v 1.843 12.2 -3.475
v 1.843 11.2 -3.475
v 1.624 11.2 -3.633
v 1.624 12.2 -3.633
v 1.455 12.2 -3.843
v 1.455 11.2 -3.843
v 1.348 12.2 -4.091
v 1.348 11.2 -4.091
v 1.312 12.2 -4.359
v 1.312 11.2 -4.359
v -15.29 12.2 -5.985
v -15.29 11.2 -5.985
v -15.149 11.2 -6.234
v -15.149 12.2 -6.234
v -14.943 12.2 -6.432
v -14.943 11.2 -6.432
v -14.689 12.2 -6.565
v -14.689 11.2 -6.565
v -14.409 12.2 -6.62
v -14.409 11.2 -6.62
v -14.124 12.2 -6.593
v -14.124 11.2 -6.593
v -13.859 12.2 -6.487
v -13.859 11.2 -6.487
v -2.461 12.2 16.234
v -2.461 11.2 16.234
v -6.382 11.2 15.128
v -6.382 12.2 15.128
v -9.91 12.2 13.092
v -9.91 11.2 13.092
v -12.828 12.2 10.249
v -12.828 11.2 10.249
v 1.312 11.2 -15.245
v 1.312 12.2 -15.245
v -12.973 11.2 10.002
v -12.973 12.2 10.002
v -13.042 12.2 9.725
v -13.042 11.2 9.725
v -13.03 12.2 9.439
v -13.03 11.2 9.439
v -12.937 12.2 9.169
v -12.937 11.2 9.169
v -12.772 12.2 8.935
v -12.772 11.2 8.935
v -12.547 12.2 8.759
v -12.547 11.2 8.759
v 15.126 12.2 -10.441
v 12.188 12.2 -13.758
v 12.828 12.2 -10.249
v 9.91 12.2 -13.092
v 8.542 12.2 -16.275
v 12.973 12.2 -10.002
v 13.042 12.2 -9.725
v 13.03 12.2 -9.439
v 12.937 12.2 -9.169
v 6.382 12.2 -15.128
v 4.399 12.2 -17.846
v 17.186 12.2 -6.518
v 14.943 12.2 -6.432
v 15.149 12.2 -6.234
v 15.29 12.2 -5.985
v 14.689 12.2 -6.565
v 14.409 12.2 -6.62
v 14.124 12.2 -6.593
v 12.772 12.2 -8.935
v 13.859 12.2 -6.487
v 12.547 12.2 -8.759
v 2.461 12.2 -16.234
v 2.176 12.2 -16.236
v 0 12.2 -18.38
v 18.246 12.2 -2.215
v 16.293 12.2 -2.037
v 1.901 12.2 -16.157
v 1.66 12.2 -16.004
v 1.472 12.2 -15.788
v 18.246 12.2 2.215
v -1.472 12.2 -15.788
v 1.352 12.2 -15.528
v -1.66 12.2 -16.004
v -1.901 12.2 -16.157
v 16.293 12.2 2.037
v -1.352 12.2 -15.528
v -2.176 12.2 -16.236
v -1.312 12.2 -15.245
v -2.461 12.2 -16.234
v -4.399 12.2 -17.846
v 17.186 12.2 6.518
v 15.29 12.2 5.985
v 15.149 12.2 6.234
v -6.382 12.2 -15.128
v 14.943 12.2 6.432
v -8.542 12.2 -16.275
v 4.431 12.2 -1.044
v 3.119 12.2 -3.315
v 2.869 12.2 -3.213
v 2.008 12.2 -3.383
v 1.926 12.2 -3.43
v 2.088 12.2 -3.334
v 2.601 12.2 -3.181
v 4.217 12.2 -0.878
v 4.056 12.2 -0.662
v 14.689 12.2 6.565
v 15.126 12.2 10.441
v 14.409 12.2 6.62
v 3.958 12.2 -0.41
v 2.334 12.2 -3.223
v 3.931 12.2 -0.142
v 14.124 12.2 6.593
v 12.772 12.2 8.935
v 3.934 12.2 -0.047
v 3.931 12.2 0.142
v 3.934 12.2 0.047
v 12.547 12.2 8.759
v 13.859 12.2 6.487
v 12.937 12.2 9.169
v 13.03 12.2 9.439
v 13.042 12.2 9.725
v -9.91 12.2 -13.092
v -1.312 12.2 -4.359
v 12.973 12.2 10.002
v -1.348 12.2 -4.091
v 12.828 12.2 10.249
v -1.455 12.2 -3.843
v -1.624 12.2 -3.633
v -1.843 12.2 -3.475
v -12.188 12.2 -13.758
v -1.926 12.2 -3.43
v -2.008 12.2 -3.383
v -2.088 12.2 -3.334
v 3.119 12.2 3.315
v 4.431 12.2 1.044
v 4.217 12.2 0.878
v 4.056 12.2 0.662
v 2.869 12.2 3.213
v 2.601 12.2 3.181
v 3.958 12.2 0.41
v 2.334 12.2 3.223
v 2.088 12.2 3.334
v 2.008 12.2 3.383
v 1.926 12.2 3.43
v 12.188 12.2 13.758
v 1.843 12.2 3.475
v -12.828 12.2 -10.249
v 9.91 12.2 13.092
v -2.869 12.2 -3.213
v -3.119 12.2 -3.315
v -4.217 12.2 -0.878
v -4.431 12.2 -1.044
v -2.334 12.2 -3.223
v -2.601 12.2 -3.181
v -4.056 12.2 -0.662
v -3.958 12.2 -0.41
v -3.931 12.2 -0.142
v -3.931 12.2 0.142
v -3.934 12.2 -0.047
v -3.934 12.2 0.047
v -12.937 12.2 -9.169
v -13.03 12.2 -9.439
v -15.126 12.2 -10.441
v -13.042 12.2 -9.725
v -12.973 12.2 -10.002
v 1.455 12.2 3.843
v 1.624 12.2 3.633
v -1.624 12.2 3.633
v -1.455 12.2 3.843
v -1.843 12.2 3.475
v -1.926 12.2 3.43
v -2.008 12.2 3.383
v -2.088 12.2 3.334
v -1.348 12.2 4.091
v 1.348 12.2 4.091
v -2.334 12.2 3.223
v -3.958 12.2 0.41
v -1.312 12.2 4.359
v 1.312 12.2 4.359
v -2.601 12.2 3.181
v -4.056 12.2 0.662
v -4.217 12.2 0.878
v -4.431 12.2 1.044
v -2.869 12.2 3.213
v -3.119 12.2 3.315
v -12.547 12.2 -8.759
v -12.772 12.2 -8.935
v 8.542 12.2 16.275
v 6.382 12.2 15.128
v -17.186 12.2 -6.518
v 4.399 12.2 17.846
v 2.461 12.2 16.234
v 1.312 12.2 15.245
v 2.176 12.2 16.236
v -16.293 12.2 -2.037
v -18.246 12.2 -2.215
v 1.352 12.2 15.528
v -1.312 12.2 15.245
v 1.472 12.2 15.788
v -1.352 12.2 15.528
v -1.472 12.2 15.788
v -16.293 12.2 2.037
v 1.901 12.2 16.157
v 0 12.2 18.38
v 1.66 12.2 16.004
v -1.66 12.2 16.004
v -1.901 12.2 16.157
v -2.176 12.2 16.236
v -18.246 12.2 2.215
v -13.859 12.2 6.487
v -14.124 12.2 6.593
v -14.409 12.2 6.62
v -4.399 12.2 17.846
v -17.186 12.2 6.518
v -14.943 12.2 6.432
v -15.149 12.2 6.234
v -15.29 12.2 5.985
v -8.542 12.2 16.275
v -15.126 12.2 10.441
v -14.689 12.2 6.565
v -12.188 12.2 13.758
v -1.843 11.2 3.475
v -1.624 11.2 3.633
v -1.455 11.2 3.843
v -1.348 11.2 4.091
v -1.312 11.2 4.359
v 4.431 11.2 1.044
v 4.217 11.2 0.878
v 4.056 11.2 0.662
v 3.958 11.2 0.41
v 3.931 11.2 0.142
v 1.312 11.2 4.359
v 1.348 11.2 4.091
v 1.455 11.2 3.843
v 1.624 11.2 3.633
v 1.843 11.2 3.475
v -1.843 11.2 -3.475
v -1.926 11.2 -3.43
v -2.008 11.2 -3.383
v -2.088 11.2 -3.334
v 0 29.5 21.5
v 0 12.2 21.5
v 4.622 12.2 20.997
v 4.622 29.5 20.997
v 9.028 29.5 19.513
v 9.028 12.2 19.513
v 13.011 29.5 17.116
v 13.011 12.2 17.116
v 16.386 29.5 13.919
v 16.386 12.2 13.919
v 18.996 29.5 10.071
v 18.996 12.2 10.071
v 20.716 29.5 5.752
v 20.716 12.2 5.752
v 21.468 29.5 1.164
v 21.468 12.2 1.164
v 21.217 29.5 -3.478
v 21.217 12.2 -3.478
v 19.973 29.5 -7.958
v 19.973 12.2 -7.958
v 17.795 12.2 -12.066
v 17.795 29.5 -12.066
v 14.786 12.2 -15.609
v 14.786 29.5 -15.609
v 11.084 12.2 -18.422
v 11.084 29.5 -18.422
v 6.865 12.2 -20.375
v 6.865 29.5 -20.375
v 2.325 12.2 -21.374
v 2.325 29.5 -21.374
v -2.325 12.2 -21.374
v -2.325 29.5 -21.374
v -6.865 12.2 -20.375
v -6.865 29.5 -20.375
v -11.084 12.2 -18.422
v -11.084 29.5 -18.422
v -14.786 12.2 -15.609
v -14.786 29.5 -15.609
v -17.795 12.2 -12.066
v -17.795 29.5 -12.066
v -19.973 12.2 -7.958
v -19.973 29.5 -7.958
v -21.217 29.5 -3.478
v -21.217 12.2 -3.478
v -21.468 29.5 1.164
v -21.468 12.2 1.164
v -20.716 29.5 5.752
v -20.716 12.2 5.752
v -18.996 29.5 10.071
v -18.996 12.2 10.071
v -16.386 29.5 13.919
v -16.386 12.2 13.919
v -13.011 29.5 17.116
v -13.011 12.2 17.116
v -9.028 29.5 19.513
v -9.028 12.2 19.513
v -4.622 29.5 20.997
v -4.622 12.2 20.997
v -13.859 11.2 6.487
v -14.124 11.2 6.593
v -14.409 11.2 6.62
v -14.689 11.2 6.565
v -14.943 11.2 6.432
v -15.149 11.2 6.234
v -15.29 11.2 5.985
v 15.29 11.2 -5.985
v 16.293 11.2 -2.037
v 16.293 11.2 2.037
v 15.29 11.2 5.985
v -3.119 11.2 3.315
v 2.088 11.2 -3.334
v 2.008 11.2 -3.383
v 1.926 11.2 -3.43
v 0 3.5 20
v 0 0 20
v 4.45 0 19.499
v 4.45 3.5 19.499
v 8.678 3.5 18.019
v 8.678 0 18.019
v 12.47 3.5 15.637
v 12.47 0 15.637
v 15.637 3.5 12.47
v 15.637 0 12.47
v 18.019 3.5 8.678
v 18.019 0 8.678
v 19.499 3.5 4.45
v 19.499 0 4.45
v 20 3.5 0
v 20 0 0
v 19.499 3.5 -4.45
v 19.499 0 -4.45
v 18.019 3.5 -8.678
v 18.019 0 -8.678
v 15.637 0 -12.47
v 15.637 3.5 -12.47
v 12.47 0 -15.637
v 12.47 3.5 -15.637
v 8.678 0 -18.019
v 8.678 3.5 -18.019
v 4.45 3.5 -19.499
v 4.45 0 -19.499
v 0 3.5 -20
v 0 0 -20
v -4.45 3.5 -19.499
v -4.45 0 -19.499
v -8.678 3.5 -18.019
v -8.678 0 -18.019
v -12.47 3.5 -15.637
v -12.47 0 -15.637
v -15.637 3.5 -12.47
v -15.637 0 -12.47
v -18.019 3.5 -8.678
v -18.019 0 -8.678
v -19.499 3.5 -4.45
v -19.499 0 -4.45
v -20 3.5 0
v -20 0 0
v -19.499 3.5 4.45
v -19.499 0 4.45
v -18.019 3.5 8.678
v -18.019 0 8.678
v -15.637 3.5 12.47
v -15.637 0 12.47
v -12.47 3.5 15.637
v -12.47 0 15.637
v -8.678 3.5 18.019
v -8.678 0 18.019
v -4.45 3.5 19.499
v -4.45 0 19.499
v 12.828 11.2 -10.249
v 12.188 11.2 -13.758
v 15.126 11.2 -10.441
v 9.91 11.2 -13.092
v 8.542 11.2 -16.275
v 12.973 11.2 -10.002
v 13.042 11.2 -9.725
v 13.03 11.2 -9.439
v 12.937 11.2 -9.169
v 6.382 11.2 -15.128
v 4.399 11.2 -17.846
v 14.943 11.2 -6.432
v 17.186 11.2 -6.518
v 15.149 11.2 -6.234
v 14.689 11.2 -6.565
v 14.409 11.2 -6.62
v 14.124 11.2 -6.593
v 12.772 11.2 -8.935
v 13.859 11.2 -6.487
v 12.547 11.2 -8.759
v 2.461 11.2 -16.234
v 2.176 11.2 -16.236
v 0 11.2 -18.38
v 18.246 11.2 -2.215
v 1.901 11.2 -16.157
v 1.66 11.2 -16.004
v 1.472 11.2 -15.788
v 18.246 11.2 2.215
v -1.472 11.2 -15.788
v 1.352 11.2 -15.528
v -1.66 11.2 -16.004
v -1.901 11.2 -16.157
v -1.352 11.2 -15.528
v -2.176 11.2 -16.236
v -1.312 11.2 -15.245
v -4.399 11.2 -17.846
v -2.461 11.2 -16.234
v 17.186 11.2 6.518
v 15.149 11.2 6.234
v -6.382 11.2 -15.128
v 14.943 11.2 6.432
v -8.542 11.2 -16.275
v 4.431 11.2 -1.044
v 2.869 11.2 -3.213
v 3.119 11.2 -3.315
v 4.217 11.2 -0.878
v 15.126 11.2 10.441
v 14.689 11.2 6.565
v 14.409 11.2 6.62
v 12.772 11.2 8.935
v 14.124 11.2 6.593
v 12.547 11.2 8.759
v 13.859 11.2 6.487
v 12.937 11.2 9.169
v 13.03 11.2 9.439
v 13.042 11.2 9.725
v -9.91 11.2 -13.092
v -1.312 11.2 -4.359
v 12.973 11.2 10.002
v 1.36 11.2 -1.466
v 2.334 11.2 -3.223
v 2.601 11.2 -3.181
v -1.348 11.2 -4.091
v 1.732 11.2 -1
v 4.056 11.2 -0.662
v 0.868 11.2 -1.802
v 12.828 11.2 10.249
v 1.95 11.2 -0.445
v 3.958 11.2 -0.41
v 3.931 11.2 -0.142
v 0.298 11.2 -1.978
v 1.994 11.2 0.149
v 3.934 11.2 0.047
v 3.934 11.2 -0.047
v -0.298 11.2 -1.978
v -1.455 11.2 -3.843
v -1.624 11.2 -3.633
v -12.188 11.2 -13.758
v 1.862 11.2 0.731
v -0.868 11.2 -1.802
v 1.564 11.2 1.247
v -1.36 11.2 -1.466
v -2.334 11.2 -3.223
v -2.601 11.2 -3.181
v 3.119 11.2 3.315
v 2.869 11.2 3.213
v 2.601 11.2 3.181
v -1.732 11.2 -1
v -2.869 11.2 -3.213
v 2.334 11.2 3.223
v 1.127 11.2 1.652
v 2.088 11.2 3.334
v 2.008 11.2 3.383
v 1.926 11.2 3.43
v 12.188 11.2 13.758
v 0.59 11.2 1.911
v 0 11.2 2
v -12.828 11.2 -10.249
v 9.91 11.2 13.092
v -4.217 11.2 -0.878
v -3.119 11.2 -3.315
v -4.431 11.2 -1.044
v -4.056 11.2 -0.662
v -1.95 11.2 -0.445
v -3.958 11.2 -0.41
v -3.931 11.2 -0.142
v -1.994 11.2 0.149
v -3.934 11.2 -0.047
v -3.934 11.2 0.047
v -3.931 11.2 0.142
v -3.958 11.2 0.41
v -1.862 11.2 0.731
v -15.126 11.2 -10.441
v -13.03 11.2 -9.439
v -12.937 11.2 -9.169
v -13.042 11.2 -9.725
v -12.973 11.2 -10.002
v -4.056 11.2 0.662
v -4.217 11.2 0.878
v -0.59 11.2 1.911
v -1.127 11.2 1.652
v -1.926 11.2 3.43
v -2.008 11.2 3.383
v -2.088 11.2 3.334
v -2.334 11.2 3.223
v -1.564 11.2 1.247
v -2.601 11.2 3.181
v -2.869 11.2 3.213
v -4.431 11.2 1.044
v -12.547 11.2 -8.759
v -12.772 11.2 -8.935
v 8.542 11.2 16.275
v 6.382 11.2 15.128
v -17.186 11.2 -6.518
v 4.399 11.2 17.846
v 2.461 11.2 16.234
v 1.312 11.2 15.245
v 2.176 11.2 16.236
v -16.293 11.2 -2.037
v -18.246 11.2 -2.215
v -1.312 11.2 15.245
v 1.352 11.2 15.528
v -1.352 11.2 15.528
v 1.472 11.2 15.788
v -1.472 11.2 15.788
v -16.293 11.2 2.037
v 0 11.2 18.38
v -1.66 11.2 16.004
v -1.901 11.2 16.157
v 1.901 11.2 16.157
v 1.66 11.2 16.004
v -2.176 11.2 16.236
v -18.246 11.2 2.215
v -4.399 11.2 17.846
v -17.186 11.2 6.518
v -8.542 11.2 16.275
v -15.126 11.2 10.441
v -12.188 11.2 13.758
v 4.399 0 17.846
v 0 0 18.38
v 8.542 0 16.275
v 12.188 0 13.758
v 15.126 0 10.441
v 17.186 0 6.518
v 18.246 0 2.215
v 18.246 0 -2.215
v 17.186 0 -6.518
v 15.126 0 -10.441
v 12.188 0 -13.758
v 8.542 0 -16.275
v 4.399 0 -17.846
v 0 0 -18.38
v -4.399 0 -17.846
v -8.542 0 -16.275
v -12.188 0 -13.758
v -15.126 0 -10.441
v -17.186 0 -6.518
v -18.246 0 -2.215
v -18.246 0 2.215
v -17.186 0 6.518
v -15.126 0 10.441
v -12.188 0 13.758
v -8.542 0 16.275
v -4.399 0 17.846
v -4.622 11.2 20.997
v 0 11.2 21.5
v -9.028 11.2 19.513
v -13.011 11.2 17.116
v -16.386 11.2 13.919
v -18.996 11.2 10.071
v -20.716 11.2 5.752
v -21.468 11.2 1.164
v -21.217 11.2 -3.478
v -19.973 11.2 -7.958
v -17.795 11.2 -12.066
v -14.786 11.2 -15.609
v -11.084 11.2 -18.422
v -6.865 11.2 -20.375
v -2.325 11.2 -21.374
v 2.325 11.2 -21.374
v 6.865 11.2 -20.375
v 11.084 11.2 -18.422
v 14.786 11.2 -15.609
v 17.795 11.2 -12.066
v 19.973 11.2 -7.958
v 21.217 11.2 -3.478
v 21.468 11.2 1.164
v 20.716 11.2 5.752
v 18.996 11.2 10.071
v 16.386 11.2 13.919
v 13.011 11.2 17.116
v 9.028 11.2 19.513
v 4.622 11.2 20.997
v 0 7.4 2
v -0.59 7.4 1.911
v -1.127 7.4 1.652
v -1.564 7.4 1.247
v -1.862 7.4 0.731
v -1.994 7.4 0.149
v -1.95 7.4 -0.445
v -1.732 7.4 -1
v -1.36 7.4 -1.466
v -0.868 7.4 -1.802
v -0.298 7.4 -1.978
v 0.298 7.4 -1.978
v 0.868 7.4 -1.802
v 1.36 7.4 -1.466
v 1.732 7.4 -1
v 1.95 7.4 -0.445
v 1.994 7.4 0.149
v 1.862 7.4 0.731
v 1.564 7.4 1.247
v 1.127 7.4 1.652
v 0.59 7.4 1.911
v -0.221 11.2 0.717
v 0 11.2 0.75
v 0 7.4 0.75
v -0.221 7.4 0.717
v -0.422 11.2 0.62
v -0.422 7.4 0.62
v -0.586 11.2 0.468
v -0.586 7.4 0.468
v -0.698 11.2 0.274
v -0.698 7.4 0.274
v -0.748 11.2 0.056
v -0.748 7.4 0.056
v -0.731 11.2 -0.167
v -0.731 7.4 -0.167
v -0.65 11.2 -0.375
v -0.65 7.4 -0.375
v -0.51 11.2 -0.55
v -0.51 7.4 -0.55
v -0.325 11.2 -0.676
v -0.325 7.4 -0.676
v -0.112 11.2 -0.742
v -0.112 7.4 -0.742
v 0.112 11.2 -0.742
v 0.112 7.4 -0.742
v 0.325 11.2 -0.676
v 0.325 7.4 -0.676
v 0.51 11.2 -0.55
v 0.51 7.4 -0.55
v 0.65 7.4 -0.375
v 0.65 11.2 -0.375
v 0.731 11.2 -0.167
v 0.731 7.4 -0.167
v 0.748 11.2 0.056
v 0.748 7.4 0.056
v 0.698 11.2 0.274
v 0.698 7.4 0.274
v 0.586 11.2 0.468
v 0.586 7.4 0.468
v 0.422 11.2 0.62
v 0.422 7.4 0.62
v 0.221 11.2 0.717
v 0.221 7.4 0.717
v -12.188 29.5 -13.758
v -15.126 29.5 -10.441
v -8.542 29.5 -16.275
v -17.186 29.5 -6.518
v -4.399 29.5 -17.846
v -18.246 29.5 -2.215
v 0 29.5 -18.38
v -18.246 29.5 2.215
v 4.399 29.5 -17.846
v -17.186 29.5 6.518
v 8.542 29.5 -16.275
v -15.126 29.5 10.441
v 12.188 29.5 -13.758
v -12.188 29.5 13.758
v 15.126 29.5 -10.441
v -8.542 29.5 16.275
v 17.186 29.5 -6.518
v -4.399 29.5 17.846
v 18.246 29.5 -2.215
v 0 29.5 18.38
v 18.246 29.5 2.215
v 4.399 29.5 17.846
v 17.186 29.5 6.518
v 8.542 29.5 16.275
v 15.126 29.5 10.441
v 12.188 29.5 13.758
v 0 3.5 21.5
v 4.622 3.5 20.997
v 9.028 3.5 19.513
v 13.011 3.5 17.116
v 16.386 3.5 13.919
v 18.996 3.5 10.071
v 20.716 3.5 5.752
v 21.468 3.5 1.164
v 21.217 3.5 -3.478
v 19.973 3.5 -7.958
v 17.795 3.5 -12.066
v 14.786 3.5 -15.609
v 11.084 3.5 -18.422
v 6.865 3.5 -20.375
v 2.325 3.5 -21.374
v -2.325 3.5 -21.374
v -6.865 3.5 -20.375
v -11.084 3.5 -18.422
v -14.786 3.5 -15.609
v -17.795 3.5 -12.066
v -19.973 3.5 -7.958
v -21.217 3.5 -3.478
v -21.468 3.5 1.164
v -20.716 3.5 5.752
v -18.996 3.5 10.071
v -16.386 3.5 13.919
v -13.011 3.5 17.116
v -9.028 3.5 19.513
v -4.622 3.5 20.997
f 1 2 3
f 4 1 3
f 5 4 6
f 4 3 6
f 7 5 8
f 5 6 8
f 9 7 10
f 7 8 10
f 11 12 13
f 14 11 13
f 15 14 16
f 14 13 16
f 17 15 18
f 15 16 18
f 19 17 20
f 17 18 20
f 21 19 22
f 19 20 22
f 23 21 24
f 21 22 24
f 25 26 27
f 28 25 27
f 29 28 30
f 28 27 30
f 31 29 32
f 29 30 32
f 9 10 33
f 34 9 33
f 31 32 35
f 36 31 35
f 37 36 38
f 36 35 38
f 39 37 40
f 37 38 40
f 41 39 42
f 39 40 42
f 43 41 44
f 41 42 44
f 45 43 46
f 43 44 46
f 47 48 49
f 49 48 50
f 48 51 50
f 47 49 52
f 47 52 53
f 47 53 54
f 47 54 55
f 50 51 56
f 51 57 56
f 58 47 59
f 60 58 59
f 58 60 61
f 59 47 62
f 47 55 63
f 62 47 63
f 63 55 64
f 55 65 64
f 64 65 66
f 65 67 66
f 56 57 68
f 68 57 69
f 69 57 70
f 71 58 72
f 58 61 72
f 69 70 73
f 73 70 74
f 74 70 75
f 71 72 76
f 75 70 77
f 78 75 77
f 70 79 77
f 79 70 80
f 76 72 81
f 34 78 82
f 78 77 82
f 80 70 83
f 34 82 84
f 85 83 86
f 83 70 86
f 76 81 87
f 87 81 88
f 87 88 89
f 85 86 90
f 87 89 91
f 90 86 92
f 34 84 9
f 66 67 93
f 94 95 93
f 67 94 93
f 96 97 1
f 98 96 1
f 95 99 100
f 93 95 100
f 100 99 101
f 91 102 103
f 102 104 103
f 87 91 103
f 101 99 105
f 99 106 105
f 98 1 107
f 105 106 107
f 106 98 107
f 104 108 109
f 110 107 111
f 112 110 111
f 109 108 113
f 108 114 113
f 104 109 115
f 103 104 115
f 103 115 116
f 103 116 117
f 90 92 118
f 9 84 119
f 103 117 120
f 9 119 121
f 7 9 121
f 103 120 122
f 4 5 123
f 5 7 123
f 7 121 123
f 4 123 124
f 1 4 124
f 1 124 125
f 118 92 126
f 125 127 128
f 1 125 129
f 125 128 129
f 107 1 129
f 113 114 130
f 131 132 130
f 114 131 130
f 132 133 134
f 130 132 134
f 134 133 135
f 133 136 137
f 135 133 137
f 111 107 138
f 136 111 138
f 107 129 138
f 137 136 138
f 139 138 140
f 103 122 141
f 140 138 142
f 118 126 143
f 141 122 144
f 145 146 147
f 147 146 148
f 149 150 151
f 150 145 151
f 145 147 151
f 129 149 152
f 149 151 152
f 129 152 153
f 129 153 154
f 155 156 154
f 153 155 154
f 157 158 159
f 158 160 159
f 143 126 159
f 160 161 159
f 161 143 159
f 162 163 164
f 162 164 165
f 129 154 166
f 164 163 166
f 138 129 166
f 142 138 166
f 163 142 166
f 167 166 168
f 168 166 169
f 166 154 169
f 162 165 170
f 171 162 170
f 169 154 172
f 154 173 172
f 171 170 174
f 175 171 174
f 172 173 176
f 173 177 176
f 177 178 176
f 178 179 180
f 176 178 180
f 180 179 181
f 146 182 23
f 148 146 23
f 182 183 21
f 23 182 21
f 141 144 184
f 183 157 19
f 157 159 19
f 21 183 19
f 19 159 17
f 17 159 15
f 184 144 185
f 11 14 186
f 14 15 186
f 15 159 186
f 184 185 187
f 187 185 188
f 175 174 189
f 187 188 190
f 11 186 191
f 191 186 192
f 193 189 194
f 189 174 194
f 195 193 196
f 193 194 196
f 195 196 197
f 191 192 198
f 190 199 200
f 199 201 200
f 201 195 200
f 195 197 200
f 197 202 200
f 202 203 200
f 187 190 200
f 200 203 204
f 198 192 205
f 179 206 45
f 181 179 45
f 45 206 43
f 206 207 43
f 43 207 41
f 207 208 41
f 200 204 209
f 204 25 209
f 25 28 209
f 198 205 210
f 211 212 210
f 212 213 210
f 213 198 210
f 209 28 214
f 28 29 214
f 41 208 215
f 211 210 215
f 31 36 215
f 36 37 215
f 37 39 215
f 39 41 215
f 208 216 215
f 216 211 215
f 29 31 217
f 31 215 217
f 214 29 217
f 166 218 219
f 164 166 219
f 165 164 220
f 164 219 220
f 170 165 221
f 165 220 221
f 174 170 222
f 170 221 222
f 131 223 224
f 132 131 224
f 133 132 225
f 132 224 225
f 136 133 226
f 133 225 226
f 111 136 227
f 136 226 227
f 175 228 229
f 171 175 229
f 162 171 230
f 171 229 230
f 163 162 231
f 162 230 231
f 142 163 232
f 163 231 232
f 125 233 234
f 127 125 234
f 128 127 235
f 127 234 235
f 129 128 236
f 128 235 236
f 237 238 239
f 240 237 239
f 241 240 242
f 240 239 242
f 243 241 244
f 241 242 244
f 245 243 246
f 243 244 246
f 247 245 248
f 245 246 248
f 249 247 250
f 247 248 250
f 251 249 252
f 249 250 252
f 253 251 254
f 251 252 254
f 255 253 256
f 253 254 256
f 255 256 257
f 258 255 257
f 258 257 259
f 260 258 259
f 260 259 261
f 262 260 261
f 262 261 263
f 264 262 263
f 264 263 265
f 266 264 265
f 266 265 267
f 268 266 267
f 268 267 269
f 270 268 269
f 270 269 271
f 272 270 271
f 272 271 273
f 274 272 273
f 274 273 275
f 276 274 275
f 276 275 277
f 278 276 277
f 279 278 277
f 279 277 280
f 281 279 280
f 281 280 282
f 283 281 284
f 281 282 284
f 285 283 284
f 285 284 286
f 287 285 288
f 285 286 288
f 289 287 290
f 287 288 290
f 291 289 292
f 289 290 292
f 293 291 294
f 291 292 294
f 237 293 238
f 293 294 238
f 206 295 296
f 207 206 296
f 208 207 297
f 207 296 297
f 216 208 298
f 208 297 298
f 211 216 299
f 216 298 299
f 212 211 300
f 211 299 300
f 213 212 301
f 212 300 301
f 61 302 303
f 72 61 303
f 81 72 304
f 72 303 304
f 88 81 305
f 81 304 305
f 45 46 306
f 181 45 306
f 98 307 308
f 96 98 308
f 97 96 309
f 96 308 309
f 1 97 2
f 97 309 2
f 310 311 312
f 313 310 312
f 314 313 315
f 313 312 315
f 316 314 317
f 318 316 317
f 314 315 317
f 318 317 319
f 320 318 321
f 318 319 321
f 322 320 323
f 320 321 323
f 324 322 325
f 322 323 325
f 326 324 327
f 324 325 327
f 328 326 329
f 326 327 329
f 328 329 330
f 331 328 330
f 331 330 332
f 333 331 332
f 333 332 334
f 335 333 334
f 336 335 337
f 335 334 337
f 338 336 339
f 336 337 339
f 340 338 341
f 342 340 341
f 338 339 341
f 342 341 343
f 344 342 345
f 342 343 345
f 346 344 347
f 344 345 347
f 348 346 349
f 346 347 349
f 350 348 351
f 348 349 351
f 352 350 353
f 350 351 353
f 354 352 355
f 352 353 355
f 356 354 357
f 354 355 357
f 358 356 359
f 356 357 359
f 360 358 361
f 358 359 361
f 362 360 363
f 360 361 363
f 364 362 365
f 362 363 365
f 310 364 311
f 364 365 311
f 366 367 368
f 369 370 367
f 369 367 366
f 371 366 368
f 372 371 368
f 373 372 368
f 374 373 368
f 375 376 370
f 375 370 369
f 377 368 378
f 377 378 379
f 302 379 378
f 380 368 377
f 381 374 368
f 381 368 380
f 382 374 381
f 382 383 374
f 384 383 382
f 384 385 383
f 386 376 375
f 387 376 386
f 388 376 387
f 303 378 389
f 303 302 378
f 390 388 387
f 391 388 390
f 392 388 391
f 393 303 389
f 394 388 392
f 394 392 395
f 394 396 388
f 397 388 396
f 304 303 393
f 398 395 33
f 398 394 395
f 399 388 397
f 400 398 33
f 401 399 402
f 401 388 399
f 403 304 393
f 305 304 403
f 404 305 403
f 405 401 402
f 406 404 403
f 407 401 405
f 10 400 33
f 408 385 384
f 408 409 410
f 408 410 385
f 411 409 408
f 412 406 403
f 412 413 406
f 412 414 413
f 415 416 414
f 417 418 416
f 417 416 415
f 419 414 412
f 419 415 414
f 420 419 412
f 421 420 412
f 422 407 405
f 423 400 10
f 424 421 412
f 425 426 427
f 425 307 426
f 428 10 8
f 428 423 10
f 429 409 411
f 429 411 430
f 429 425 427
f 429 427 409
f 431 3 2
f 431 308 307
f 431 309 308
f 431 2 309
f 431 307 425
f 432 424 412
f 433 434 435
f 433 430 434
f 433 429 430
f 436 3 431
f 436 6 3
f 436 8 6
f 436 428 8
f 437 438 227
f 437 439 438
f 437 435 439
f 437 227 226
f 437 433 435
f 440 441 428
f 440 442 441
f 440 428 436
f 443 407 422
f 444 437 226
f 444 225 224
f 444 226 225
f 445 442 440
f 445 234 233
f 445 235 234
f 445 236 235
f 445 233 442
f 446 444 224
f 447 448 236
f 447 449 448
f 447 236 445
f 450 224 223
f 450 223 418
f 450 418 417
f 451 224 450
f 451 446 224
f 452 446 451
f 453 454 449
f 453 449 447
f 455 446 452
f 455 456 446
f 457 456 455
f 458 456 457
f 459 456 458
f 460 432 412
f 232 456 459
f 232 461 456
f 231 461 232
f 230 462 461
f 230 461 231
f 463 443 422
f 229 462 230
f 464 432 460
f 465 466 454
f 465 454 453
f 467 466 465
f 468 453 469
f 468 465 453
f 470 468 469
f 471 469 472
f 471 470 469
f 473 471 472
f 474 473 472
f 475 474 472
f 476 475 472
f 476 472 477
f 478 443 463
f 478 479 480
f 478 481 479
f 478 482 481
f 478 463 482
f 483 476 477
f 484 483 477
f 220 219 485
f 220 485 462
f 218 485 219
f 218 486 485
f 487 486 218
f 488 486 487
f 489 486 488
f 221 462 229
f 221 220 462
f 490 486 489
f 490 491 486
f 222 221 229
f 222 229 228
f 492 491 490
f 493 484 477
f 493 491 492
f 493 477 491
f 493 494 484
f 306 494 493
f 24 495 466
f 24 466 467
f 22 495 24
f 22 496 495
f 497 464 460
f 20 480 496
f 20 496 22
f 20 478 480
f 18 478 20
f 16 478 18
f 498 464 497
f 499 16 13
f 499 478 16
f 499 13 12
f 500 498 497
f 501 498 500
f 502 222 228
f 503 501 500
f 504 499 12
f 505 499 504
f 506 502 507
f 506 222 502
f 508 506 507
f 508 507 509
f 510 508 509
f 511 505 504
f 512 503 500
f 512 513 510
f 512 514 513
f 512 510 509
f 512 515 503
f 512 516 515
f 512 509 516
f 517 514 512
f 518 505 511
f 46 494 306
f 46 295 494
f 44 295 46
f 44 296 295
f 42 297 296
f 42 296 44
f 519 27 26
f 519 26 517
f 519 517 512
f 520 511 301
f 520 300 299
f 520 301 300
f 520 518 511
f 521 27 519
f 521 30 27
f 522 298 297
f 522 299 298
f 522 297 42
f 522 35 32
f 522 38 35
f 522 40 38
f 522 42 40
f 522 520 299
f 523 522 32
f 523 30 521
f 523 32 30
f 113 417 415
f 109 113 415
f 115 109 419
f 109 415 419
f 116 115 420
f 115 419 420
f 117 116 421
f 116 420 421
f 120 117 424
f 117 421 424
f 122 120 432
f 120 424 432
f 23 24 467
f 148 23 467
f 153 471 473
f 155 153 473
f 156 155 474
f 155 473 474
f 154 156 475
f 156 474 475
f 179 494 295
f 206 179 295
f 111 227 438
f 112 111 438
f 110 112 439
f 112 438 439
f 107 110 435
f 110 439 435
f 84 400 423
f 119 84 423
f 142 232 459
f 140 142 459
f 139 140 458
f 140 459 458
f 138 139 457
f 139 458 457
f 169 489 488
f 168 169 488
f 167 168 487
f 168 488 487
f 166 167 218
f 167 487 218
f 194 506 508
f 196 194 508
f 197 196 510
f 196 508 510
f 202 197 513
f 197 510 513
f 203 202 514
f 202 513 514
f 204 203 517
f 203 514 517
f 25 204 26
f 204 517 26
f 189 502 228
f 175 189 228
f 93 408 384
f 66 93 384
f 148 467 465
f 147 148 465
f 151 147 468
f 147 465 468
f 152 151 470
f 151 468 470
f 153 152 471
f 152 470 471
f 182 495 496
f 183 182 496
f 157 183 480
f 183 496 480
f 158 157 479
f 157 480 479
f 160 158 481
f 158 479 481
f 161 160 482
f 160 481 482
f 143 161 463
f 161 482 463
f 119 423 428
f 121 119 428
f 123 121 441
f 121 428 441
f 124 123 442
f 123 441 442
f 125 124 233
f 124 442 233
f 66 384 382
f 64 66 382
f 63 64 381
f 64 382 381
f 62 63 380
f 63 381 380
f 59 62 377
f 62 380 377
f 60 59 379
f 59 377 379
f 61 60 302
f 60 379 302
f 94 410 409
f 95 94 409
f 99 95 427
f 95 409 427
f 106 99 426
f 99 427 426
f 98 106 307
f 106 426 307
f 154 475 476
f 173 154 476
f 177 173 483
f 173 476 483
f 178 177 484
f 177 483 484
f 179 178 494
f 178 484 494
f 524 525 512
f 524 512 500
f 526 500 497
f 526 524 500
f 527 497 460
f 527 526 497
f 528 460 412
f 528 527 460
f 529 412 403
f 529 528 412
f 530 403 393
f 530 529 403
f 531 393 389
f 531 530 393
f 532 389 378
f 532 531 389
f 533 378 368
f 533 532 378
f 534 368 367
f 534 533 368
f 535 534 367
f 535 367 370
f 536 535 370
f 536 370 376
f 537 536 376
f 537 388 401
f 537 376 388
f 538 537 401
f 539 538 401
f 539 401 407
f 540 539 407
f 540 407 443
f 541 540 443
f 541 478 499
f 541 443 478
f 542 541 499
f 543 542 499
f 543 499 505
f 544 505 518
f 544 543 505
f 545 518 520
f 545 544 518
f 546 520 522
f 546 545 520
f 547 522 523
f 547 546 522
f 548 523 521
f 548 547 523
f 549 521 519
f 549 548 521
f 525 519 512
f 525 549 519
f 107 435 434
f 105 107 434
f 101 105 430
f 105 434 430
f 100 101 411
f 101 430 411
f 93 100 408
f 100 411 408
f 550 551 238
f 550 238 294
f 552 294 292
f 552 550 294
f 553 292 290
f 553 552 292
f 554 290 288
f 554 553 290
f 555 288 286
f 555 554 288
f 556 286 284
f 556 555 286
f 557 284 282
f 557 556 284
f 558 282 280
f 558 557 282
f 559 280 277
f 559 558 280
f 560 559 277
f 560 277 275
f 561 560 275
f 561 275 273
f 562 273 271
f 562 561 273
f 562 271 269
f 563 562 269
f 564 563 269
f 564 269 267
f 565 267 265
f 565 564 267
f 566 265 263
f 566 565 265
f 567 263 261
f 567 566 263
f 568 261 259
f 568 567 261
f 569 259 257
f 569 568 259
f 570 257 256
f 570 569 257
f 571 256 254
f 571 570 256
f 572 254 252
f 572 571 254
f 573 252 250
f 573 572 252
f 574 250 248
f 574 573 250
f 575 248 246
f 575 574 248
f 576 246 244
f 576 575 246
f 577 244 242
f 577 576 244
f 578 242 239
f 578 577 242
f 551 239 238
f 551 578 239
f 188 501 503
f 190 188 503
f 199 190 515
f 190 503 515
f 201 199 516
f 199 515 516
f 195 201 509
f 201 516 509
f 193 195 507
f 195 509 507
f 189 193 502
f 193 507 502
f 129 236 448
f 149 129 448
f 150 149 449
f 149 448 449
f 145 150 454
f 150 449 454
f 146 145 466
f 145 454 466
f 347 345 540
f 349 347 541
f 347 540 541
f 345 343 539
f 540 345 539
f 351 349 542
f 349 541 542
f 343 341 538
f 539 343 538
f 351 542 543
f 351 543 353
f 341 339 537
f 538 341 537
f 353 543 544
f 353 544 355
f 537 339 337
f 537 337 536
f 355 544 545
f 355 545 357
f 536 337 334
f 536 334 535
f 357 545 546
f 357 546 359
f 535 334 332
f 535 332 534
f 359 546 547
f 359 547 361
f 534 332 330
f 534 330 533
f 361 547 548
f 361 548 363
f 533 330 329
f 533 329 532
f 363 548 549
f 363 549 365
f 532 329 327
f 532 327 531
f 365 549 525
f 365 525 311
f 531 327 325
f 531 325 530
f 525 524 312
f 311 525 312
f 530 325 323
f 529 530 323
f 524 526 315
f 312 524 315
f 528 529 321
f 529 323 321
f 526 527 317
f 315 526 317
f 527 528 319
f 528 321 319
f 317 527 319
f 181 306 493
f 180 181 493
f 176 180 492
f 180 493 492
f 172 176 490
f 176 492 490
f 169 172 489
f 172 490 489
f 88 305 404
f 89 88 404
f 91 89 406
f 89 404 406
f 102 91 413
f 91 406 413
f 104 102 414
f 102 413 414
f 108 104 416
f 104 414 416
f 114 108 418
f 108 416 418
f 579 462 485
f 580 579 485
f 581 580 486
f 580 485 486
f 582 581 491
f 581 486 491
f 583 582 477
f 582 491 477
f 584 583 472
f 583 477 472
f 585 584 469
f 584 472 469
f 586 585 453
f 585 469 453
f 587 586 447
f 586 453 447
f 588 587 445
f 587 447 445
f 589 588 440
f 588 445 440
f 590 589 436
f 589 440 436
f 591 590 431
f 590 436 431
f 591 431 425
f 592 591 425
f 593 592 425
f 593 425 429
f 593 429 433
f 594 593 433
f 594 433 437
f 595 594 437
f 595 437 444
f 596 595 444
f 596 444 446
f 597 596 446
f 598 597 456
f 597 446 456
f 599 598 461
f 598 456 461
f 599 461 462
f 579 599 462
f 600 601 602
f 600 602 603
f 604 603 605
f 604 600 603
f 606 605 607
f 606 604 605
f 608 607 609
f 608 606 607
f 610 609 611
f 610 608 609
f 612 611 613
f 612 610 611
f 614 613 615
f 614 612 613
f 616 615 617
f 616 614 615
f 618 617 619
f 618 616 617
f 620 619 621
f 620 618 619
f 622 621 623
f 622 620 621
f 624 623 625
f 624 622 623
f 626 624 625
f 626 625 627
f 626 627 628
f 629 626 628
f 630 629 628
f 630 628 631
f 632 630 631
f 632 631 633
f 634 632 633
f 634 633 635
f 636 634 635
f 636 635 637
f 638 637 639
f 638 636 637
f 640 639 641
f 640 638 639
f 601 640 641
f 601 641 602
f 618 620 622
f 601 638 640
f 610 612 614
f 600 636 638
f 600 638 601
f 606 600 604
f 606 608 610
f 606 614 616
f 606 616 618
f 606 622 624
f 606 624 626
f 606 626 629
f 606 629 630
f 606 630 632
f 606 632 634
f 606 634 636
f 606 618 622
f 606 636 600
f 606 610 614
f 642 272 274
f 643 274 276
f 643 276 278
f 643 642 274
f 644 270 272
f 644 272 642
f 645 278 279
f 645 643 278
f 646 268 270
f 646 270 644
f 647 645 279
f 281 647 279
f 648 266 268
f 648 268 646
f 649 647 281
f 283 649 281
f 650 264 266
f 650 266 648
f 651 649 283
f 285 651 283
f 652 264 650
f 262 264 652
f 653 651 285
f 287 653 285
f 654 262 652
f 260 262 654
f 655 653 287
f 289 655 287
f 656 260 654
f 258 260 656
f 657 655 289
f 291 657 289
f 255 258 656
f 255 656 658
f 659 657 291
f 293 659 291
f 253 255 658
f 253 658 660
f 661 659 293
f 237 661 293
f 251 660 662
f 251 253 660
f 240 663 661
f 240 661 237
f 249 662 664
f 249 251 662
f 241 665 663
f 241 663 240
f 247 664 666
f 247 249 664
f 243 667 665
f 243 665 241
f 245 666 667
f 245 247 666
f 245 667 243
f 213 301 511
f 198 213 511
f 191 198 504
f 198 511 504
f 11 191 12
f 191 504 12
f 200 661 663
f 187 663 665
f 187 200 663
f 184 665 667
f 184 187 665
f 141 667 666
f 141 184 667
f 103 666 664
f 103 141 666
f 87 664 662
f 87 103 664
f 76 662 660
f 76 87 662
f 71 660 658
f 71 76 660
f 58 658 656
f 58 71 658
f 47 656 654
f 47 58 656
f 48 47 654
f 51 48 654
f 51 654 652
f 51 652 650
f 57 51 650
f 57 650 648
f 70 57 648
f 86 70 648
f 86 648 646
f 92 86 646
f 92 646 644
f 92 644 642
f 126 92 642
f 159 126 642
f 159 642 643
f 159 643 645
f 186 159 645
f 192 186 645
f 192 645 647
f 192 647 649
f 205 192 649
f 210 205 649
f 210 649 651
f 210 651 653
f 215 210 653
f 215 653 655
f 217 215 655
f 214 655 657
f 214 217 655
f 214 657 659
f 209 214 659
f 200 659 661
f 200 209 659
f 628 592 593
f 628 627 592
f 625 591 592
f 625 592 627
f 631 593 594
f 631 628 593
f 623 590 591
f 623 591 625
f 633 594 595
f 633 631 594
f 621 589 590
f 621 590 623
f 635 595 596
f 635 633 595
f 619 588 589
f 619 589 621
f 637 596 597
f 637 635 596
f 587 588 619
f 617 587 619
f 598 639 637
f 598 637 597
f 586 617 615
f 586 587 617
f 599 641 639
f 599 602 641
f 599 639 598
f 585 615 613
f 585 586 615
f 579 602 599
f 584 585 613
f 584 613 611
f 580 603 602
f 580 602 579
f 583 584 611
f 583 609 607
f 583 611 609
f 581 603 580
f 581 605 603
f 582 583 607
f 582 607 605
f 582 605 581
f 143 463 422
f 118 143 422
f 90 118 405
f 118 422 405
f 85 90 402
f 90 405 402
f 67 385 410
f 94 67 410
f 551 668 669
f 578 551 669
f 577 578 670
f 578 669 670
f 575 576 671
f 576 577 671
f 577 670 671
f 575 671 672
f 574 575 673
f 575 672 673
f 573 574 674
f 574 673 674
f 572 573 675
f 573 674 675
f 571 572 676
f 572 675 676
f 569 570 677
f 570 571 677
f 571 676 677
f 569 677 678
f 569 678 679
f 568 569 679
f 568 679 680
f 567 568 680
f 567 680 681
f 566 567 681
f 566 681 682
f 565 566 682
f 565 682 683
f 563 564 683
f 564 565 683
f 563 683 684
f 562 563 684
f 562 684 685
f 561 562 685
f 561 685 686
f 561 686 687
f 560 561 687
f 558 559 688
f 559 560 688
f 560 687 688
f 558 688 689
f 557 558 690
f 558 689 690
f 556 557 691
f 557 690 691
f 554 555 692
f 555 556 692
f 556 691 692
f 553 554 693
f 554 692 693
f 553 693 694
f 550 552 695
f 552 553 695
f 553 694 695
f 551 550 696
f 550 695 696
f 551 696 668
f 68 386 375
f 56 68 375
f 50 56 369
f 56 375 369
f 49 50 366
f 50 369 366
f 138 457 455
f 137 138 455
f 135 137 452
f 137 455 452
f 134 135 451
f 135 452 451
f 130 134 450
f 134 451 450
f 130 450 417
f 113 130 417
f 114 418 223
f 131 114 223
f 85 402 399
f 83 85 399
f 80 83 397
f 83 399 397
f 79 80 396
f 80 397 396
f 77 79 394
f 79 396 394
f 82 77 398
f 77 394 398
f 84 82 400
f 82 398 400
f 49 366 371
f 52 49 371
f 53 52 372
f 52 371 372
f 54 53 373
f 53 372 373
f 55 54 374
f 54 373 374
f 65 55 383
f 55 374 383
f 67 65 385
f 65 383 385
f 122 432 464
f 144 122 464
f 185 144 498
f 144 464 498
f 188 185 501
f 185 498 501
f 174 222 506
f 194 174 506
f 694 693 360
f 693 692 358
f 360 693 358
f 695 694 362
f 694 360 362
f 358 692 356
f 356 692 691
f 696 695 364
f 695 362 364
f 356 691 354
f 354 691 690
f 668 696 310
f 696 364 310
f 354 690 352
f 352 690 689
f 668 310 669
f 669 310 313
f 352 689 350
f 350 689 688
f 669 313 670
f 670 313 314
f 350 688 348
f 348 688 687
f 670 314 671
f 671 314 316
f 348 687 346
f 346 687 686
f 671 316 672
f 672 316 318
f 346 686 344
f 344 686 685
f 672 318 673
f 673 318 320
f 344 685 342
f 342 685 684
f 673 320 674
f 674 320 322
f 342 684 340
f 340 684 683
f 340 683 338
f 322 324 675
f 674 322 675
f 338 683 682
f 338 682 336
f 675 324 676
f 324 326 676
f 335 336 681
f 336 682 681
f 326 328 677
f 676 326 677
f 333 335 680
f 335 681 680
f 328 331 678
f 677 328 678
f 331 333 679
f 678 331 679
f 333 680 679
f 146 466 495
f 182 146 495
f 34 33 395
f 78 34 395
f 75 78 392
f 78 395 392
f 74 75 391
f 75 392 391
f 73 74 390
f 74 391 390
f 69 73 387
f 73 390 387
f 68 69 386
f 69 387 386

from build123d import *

# Parameters (mm, degrees)
SKETCH1_R           = 21.5
SKETCH1_R_2         = 18.38
BOSS_EXTRUDE1_DEPTH = 29.5
SKETCH3_R           = 21.5
BOSS_EXTRUDE2_DEPTH = 1
SKETCH4_R           = 2
SKETCH4_R_2         = 0.75
BOSS_EXTRUDE3_DEPTH = 3.8
SKETCH5_OUTSIDE_W   = 58.518
SKETCH5_OUTSIDE_H   = 58.518
SKETCH5_OUTSIDE_R   = 20
CUT_EXTRUDE1_DEPTH  = 3.5
CUT_EXTRUDE2_REACH  = 37.488
CIRPATTERN1_COUNT   = 6


with BuildPart() as part:
    # Sketch1 → Boss-Extrude1 (new body)
    with BuildSketch(Plane(origin=(0, 0, 0), x_dir=(1, 0, 0), z_dir=(0, 1, 0))):
        with Locations(Location((0, 0, 0), (0, 0, 270))):
            Circle(SKETCH1_R)
        with Locations(Location((0, 0, 0), (0, 0, 270))):
            Circle(SKETCH1_R_2, mode=Mode.SUBTRACT)
    extrude(amount=BOSS_EXTRUDE1_DEPTH)

    # Sketch3 → Boss-Extrude2 (add)
    with BuildSketch(Plane(origin=(0, 11.2, 0), x_dir=(-1, 0, 0), z_dir=(0, -1, 0))):
        with Locations(Location((0, 0, 0), (0, 0, 270))):
            Circle(SKETCH3_R)
    extrude(amount=-BOSS_EXTRUDE2_DEPTH)

    # Sketch4 → Boss-Extrude3 (add)
    with BuildSketch(Plane(origin=(0, 11.2, 0), x_dir=(-1, 0, 0), z_dir=(0, -1, 0))):
        with Locations(Location((0, 0, 0), (0, 0, 270))):
            Circle(SKETCH4_R)
        with Locations(Location((0, 0, 0), (0, 0, 270))):
            Circle(SKETCH4_R_2, mode=Mode.SUBTRACT)
    extrude(amount=BOSS_EXTRUDE3_DEPTH)

    # Sketch5 outside → Cut-Extrude1 (cut)
    with BuildSketch(Plane(origin=(0, 0, 0), x_dir=(1, 0, 0), z_dir=(0, 1, 0))):
        Rectangle(SKETCH5_OUTSIDE_W, SKETCH5_OUTSIDE_H)
        with Locations(Location((0, 0, 0), (0, 0, 270))):
            Circle(SKETCH5_OUTSIDE_R, mode=Mode.SUBTRACT)
    extrude(amount=CUT_EXTRUDE1_DEPTH, mode=Mode.SUBTRACT)

    # Sketch6 → Cut-Extrude2 (cut, up to next)
    with BuildSketch(Plane(origin=(0, 11.2, 0), x_dir=(-1, 0, 0), z_dir=(0, -1, 0)), mode=Mode.PRIVATE) as cut_extrude2_sk1:
        with BuildLine():
            Line((1.311528297, -4.358954791), (1.311528297, -15.245444515))
            ThreePointArc((1.311528297, -15.245444515), (1.659572625, -16.003701596), (2.461435901, -16.234144525))
            ThreePointArc((2.461435901, -16.234144525), (8.209843408, -14.219865905), (12.828463617, -10.248738282))
            ThreePointArc((12.828463617, -10.248738282), (13.029825824, -9.439082851), (12.547178093, -8.75853908))
            Line((12.547178093, -8.75853908), (3.119201435, -3.315294219))
            ThreePointArc((3.119201435, -3.315294219), (2.601197124, -3.181481713), (2.088346263, -3.333857065))
            ThreePointArc((2.088346263, -3.333857065), (1.966964225, -3.406881974), (1.843031779, -3.475489448))
            ThreePointArc((1.843031779, -3.475489448), (1.454645424, -3.843443646), (1.311528297, -4.358954791))
        make_face()
    cut_extrude2_tool1 = extrude(cut_extrude2_sk1.sketch, amount=-CUT_EXTRUDE2_REACH, mode=Mode.PRIVATE) & part.part
    cut_extrude2 = cut_extrude2_tool1.solids().sort_by_distance((-5.765973, 11.2, 9.986958))[0]
    add(cut_extrude2, mode=Mode.SUBTRACT)

    # CirPattern1: Cut-Extrude2 ×6 about axis
    cirpattern1_axis = Axis((0, 0, 0), (0, 1, 0))
    for i in range(1, CIRPATTERN1_COUNT):
        add(cut_extrude2.rotate(cirpattern1_axis, i * 360 / CIRPATTERN1_COUNT), mode=Mode.SUBTRACT)


solid = part.part
